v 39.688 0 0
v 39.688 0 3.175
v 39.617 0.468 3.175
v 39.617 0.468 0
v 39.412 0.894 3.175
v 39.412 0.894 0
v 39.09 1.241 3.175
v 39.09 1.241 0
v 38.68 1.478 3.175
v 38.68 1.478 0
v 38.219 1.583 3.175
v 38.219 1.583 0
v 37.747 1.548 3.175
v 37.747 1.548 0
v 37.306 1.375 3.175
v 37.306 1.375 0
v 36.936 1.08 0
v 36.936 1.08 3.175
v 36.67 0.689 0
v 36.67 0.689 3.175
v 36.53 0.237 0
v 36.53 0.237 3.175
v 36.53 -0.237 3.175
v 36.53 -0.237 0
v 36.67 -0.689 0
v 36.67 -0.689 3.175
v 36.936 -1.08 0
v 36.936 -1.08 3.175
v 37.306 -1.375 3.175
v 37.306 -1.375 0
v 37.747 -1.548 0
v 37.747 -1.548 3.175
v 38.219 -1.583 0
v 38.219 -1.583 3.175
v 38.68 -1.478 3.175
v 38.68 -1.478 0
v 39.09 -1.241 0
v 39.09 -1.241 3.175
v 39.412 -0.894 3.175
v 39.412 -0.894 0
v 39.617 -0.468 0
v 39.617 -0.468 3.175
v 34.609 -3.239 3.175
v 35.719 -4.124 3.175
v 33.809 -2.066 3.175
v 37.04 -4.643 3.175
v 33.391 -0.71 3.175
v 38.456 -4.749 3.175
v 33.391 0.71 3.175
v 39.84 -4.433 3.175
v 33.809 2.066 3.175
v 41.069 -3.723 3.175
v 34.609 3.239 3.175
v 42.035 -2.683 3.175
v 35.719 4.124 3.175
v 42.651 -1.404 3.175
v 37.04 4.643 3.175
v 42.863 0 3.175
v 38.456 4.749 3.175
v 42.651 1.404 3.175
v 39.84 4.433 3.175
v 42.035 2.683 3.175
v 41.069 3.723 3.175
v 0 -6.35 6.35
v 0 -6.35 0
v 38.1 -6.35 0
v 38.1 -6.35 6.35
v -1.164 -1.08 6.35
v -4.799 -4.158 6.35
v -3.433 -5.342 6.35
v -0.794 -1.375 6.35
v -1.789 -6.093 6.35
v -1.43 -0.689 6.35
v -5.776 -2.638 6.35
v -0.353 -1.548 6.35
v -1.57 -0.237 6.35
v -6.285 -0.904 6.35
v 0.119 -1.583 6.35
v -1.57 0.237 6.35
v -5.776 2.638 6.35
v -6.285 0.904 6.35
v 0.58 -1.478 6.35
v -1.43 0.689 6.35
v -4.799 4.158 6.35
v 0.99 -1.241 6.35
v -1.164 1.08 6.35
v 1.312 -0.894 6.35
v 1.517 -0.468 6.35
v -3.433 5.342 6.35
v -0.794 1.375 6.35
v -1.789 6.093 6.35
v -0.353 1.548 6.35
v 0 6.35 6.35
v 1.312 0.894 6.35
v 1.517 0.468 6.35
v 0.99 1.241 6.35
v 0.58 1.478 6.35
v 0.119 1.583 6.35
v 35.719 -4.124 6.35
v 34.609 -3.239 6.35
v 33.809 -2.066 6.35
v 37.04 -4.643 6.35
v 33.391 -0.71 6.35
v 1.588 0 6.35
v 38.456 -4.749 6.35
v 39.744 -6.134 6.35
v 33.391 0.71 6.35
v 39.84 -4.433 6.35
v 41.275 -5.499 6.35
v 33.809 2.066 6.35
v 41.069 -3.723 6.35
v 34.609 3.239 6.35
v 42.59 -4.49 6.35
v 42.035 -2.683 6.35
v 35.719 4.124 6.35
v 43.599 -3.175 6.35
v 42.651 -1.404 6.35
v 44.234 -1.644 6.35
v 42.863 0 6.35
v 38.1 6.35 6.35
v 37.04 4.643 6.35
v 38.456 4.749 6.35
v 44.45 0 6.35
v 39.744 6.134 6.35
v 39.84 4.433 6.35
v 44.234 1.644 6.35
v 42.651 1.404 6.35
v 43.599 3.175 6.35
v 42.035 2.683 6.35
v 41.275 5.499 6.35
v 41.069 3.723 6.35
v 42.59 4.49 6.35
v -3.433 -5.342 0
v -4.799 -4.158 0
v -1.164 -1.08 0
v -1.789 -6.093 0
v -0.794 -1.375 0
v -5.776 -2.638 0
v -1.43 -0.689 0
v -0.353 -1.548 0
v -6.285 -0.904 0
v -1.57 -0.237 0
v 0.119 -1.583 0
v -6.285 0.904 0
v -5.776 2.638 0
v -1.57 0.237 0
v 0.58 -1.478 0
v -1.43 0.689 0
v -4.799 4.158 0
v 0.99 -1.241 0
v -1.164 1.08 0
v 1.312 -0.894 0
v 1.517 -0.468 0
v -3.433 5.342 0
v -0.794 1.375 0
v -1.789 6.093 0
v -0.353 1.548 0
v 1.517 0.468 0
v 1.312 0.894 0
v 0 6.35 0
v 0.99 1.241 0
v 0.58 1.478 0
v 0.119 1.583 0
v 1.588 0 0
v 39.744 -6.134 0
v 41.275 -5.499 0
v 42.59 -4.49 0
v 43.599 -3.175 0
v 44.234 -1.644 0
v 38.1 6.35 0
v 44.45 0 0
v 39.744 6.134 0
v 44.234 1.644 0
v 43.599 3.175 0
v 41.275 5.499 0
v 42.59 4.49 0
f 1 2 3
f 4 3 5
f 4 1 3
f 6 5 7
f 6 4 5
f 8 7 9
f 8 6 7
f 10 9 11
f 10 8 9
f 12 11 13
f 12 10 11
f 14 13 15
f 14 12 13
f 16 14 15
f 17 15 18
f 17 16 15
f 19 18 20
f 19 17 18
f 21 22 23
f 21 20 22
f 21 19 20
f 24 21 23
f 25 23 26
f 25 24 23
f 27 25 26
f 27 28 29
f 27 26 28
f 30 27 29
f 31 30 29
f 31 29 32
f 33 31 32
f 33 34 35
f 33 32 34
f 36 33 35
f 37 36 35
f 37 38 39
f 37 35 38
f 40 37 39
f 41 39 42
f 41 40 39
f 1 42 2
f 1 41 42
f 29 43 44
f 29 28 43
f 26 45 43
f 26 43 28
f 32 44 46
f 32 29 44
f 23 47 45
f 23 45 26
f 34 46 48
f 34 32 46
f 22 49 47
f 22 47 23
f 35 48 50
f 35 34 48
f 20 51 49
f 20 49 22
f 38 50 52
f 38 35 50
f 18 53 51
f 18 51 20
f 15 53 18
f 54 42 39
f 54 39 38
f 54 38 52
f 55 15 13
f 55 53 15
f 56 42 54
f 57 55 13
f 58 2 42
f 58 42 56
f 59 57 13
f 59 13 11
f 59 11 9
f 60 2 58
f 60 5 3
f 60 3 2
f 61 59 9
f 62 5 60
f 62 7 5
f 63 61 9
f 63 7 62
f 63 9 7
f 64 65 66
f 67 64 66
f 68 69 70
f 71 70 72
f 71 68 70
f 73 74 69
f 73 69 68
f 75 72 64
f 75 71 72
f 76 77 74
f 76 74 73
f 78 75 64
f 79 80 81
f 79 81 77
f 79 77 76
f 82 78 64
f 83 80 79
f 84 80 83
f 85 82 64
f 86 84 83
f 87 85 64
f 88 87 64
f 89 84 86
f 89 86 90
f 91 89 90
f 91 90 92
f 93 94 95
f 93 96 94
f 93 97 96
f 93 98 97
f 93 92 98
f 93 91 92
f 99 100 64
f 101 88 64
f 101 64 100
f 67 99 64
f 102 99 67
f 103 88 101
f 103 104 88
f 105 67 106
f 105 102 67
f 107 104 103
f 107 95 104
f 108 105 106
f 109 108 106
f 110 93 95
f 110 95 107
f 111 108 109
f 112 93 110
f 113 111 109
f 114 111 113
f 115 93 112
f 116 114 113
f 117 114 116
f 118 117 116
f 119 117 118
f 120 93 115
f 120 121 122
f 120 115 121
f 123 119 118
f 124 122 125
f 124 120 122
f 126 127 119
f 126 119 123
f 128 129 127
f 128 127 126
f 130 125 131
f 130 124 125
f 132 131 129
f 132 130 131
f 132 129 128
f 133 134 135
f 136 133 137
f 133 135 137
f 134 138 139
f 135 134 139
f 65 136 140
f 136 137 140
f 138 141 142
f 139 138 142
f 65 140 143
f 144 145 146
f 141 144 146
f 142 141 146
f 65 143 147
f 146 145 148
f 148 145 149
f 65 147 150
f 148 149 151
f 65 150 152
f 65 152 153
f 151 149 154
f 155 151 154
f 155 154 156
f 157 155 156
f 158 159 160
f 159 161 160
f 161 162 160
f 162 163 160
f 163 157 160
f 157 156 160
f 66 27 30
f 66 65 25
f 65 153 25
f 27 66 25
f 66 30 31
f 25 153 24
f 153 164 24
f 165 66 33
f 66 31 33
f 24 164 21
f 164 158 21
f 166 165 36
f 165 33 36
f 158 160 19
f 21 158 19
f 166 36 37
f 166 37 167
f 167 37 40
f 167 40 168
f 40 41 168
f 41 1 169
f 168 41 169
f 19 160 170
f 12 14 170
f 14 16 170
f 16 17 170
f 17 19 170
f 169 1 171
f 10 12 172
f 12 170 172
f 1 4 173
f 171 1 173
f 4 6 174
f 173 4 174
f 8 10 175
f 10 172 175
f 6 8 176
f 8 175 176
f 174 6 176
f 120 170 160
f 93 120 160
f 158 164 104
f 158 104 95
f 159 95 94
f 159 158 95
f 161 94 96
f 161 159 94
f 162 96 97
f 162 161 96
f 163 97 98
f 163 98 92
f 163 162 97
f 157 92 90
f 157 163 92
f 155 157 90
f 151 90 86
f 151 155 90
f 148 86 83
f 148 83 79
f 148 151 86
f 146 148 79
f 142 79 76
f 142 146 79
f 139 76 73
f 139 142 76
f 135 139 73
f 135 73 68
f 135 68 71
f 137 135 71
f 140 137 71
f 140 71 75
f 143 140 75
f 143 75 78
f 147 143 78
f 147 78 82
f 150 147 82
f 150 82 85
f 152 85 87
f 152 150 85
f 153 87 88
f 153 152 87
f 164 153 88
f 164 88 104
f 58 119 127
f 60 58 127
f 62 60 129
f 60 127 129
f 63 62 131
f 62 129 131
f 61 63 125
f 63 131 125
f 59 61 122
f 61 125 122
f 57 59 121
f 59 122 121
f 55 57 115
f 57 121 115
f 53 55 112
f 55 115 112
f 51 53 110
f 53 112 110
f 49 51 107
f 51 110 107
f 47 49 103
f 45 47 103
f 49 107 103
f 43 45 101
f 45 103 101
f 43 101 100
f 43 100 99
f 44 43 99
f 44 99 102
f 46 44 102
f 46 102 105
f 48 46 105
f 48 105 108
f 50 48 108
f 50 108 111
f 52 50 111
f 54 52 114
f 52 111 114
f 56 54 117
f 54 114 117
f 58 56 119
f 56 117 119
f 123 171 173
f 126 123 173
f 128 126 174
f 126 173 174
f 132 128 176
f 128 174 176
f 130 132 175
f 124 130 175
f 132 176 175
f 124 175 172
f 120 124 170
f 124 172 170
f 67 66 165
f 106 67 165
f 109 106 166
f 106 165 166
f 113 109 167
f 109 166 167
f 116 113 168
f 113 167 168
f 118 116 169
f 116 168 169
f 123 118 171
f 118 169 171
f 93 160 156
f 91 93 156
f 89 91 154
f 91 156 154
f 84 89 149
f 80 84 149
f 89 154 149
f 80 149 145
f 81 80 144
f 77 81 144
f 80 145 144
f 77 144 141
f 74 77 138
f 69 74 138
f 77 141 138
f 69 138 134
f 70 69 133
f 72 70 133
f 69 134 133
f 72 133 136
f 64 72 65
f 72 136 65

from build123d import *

# Parameters (mm, degrees)
F0_R     = 1.5875
F1_DEPTH = 6.35
F2_R     = 4.7625
F3_DEPTH = 3.175


with BuildPart() as f1:
    # F0 (on Top) → F1 (new body)
    with BuildSketch(Plane.XY):
        with BuildLine():
            ThreePointArc((0, 6.35), (4.490128, 4.490128), (6.35, 0))
            ThreePointArc((6.35, 0), (4.490128, -4.490128), (0, -6.35))
            Line((0, -6.35), (38.1, -6.35))
            ThreePointArc((38.1, -6.35), (31.75, 0), (38.1, 6.35))
            Line((38.1, 6.35), (0, 6.35))
        make_face()
        with BuildLine():
            ThreePointArc((44.45, 0), (42.590128, 4.490128), (38.1, 6.35))
            ThreePointArc((38.1, 6.35), (31.75, 0), (38.1, -6.35))
            ThreePointArc((38.1, -6.35), (42.590128, -4.490128), (44.45, 0))
        make_face()
        with Locations((38.1, 0)):
            Circle(F0_R, mode=Mode.SUBTRACT)
        with BuildLine():
            ThreePointArc((0, -6.35), (4.490128, -4.490128), (6.35, 0))
            ThreePointArc((6.35, 0), (4.490128, 4.490128), (0, 6.35))
            ThreePointArc((0, 6.35), (-6.35, 0), (0, -6.35))
        make_face()
        Circle(F0_R, mode=Mode.SUBTRACT)
    extrude(amount=F1_DEPTH)

    # F2 (on face) → F3 (cut)
    with BuildSketch(Plane.XY.offset(6.35)):
        with Locations((38.1, 0)):
            Circle(F2_R)
    extrude(amount=-F3_DEPTH, mode=Mode.SUBTRACT)


solid = f1.part
